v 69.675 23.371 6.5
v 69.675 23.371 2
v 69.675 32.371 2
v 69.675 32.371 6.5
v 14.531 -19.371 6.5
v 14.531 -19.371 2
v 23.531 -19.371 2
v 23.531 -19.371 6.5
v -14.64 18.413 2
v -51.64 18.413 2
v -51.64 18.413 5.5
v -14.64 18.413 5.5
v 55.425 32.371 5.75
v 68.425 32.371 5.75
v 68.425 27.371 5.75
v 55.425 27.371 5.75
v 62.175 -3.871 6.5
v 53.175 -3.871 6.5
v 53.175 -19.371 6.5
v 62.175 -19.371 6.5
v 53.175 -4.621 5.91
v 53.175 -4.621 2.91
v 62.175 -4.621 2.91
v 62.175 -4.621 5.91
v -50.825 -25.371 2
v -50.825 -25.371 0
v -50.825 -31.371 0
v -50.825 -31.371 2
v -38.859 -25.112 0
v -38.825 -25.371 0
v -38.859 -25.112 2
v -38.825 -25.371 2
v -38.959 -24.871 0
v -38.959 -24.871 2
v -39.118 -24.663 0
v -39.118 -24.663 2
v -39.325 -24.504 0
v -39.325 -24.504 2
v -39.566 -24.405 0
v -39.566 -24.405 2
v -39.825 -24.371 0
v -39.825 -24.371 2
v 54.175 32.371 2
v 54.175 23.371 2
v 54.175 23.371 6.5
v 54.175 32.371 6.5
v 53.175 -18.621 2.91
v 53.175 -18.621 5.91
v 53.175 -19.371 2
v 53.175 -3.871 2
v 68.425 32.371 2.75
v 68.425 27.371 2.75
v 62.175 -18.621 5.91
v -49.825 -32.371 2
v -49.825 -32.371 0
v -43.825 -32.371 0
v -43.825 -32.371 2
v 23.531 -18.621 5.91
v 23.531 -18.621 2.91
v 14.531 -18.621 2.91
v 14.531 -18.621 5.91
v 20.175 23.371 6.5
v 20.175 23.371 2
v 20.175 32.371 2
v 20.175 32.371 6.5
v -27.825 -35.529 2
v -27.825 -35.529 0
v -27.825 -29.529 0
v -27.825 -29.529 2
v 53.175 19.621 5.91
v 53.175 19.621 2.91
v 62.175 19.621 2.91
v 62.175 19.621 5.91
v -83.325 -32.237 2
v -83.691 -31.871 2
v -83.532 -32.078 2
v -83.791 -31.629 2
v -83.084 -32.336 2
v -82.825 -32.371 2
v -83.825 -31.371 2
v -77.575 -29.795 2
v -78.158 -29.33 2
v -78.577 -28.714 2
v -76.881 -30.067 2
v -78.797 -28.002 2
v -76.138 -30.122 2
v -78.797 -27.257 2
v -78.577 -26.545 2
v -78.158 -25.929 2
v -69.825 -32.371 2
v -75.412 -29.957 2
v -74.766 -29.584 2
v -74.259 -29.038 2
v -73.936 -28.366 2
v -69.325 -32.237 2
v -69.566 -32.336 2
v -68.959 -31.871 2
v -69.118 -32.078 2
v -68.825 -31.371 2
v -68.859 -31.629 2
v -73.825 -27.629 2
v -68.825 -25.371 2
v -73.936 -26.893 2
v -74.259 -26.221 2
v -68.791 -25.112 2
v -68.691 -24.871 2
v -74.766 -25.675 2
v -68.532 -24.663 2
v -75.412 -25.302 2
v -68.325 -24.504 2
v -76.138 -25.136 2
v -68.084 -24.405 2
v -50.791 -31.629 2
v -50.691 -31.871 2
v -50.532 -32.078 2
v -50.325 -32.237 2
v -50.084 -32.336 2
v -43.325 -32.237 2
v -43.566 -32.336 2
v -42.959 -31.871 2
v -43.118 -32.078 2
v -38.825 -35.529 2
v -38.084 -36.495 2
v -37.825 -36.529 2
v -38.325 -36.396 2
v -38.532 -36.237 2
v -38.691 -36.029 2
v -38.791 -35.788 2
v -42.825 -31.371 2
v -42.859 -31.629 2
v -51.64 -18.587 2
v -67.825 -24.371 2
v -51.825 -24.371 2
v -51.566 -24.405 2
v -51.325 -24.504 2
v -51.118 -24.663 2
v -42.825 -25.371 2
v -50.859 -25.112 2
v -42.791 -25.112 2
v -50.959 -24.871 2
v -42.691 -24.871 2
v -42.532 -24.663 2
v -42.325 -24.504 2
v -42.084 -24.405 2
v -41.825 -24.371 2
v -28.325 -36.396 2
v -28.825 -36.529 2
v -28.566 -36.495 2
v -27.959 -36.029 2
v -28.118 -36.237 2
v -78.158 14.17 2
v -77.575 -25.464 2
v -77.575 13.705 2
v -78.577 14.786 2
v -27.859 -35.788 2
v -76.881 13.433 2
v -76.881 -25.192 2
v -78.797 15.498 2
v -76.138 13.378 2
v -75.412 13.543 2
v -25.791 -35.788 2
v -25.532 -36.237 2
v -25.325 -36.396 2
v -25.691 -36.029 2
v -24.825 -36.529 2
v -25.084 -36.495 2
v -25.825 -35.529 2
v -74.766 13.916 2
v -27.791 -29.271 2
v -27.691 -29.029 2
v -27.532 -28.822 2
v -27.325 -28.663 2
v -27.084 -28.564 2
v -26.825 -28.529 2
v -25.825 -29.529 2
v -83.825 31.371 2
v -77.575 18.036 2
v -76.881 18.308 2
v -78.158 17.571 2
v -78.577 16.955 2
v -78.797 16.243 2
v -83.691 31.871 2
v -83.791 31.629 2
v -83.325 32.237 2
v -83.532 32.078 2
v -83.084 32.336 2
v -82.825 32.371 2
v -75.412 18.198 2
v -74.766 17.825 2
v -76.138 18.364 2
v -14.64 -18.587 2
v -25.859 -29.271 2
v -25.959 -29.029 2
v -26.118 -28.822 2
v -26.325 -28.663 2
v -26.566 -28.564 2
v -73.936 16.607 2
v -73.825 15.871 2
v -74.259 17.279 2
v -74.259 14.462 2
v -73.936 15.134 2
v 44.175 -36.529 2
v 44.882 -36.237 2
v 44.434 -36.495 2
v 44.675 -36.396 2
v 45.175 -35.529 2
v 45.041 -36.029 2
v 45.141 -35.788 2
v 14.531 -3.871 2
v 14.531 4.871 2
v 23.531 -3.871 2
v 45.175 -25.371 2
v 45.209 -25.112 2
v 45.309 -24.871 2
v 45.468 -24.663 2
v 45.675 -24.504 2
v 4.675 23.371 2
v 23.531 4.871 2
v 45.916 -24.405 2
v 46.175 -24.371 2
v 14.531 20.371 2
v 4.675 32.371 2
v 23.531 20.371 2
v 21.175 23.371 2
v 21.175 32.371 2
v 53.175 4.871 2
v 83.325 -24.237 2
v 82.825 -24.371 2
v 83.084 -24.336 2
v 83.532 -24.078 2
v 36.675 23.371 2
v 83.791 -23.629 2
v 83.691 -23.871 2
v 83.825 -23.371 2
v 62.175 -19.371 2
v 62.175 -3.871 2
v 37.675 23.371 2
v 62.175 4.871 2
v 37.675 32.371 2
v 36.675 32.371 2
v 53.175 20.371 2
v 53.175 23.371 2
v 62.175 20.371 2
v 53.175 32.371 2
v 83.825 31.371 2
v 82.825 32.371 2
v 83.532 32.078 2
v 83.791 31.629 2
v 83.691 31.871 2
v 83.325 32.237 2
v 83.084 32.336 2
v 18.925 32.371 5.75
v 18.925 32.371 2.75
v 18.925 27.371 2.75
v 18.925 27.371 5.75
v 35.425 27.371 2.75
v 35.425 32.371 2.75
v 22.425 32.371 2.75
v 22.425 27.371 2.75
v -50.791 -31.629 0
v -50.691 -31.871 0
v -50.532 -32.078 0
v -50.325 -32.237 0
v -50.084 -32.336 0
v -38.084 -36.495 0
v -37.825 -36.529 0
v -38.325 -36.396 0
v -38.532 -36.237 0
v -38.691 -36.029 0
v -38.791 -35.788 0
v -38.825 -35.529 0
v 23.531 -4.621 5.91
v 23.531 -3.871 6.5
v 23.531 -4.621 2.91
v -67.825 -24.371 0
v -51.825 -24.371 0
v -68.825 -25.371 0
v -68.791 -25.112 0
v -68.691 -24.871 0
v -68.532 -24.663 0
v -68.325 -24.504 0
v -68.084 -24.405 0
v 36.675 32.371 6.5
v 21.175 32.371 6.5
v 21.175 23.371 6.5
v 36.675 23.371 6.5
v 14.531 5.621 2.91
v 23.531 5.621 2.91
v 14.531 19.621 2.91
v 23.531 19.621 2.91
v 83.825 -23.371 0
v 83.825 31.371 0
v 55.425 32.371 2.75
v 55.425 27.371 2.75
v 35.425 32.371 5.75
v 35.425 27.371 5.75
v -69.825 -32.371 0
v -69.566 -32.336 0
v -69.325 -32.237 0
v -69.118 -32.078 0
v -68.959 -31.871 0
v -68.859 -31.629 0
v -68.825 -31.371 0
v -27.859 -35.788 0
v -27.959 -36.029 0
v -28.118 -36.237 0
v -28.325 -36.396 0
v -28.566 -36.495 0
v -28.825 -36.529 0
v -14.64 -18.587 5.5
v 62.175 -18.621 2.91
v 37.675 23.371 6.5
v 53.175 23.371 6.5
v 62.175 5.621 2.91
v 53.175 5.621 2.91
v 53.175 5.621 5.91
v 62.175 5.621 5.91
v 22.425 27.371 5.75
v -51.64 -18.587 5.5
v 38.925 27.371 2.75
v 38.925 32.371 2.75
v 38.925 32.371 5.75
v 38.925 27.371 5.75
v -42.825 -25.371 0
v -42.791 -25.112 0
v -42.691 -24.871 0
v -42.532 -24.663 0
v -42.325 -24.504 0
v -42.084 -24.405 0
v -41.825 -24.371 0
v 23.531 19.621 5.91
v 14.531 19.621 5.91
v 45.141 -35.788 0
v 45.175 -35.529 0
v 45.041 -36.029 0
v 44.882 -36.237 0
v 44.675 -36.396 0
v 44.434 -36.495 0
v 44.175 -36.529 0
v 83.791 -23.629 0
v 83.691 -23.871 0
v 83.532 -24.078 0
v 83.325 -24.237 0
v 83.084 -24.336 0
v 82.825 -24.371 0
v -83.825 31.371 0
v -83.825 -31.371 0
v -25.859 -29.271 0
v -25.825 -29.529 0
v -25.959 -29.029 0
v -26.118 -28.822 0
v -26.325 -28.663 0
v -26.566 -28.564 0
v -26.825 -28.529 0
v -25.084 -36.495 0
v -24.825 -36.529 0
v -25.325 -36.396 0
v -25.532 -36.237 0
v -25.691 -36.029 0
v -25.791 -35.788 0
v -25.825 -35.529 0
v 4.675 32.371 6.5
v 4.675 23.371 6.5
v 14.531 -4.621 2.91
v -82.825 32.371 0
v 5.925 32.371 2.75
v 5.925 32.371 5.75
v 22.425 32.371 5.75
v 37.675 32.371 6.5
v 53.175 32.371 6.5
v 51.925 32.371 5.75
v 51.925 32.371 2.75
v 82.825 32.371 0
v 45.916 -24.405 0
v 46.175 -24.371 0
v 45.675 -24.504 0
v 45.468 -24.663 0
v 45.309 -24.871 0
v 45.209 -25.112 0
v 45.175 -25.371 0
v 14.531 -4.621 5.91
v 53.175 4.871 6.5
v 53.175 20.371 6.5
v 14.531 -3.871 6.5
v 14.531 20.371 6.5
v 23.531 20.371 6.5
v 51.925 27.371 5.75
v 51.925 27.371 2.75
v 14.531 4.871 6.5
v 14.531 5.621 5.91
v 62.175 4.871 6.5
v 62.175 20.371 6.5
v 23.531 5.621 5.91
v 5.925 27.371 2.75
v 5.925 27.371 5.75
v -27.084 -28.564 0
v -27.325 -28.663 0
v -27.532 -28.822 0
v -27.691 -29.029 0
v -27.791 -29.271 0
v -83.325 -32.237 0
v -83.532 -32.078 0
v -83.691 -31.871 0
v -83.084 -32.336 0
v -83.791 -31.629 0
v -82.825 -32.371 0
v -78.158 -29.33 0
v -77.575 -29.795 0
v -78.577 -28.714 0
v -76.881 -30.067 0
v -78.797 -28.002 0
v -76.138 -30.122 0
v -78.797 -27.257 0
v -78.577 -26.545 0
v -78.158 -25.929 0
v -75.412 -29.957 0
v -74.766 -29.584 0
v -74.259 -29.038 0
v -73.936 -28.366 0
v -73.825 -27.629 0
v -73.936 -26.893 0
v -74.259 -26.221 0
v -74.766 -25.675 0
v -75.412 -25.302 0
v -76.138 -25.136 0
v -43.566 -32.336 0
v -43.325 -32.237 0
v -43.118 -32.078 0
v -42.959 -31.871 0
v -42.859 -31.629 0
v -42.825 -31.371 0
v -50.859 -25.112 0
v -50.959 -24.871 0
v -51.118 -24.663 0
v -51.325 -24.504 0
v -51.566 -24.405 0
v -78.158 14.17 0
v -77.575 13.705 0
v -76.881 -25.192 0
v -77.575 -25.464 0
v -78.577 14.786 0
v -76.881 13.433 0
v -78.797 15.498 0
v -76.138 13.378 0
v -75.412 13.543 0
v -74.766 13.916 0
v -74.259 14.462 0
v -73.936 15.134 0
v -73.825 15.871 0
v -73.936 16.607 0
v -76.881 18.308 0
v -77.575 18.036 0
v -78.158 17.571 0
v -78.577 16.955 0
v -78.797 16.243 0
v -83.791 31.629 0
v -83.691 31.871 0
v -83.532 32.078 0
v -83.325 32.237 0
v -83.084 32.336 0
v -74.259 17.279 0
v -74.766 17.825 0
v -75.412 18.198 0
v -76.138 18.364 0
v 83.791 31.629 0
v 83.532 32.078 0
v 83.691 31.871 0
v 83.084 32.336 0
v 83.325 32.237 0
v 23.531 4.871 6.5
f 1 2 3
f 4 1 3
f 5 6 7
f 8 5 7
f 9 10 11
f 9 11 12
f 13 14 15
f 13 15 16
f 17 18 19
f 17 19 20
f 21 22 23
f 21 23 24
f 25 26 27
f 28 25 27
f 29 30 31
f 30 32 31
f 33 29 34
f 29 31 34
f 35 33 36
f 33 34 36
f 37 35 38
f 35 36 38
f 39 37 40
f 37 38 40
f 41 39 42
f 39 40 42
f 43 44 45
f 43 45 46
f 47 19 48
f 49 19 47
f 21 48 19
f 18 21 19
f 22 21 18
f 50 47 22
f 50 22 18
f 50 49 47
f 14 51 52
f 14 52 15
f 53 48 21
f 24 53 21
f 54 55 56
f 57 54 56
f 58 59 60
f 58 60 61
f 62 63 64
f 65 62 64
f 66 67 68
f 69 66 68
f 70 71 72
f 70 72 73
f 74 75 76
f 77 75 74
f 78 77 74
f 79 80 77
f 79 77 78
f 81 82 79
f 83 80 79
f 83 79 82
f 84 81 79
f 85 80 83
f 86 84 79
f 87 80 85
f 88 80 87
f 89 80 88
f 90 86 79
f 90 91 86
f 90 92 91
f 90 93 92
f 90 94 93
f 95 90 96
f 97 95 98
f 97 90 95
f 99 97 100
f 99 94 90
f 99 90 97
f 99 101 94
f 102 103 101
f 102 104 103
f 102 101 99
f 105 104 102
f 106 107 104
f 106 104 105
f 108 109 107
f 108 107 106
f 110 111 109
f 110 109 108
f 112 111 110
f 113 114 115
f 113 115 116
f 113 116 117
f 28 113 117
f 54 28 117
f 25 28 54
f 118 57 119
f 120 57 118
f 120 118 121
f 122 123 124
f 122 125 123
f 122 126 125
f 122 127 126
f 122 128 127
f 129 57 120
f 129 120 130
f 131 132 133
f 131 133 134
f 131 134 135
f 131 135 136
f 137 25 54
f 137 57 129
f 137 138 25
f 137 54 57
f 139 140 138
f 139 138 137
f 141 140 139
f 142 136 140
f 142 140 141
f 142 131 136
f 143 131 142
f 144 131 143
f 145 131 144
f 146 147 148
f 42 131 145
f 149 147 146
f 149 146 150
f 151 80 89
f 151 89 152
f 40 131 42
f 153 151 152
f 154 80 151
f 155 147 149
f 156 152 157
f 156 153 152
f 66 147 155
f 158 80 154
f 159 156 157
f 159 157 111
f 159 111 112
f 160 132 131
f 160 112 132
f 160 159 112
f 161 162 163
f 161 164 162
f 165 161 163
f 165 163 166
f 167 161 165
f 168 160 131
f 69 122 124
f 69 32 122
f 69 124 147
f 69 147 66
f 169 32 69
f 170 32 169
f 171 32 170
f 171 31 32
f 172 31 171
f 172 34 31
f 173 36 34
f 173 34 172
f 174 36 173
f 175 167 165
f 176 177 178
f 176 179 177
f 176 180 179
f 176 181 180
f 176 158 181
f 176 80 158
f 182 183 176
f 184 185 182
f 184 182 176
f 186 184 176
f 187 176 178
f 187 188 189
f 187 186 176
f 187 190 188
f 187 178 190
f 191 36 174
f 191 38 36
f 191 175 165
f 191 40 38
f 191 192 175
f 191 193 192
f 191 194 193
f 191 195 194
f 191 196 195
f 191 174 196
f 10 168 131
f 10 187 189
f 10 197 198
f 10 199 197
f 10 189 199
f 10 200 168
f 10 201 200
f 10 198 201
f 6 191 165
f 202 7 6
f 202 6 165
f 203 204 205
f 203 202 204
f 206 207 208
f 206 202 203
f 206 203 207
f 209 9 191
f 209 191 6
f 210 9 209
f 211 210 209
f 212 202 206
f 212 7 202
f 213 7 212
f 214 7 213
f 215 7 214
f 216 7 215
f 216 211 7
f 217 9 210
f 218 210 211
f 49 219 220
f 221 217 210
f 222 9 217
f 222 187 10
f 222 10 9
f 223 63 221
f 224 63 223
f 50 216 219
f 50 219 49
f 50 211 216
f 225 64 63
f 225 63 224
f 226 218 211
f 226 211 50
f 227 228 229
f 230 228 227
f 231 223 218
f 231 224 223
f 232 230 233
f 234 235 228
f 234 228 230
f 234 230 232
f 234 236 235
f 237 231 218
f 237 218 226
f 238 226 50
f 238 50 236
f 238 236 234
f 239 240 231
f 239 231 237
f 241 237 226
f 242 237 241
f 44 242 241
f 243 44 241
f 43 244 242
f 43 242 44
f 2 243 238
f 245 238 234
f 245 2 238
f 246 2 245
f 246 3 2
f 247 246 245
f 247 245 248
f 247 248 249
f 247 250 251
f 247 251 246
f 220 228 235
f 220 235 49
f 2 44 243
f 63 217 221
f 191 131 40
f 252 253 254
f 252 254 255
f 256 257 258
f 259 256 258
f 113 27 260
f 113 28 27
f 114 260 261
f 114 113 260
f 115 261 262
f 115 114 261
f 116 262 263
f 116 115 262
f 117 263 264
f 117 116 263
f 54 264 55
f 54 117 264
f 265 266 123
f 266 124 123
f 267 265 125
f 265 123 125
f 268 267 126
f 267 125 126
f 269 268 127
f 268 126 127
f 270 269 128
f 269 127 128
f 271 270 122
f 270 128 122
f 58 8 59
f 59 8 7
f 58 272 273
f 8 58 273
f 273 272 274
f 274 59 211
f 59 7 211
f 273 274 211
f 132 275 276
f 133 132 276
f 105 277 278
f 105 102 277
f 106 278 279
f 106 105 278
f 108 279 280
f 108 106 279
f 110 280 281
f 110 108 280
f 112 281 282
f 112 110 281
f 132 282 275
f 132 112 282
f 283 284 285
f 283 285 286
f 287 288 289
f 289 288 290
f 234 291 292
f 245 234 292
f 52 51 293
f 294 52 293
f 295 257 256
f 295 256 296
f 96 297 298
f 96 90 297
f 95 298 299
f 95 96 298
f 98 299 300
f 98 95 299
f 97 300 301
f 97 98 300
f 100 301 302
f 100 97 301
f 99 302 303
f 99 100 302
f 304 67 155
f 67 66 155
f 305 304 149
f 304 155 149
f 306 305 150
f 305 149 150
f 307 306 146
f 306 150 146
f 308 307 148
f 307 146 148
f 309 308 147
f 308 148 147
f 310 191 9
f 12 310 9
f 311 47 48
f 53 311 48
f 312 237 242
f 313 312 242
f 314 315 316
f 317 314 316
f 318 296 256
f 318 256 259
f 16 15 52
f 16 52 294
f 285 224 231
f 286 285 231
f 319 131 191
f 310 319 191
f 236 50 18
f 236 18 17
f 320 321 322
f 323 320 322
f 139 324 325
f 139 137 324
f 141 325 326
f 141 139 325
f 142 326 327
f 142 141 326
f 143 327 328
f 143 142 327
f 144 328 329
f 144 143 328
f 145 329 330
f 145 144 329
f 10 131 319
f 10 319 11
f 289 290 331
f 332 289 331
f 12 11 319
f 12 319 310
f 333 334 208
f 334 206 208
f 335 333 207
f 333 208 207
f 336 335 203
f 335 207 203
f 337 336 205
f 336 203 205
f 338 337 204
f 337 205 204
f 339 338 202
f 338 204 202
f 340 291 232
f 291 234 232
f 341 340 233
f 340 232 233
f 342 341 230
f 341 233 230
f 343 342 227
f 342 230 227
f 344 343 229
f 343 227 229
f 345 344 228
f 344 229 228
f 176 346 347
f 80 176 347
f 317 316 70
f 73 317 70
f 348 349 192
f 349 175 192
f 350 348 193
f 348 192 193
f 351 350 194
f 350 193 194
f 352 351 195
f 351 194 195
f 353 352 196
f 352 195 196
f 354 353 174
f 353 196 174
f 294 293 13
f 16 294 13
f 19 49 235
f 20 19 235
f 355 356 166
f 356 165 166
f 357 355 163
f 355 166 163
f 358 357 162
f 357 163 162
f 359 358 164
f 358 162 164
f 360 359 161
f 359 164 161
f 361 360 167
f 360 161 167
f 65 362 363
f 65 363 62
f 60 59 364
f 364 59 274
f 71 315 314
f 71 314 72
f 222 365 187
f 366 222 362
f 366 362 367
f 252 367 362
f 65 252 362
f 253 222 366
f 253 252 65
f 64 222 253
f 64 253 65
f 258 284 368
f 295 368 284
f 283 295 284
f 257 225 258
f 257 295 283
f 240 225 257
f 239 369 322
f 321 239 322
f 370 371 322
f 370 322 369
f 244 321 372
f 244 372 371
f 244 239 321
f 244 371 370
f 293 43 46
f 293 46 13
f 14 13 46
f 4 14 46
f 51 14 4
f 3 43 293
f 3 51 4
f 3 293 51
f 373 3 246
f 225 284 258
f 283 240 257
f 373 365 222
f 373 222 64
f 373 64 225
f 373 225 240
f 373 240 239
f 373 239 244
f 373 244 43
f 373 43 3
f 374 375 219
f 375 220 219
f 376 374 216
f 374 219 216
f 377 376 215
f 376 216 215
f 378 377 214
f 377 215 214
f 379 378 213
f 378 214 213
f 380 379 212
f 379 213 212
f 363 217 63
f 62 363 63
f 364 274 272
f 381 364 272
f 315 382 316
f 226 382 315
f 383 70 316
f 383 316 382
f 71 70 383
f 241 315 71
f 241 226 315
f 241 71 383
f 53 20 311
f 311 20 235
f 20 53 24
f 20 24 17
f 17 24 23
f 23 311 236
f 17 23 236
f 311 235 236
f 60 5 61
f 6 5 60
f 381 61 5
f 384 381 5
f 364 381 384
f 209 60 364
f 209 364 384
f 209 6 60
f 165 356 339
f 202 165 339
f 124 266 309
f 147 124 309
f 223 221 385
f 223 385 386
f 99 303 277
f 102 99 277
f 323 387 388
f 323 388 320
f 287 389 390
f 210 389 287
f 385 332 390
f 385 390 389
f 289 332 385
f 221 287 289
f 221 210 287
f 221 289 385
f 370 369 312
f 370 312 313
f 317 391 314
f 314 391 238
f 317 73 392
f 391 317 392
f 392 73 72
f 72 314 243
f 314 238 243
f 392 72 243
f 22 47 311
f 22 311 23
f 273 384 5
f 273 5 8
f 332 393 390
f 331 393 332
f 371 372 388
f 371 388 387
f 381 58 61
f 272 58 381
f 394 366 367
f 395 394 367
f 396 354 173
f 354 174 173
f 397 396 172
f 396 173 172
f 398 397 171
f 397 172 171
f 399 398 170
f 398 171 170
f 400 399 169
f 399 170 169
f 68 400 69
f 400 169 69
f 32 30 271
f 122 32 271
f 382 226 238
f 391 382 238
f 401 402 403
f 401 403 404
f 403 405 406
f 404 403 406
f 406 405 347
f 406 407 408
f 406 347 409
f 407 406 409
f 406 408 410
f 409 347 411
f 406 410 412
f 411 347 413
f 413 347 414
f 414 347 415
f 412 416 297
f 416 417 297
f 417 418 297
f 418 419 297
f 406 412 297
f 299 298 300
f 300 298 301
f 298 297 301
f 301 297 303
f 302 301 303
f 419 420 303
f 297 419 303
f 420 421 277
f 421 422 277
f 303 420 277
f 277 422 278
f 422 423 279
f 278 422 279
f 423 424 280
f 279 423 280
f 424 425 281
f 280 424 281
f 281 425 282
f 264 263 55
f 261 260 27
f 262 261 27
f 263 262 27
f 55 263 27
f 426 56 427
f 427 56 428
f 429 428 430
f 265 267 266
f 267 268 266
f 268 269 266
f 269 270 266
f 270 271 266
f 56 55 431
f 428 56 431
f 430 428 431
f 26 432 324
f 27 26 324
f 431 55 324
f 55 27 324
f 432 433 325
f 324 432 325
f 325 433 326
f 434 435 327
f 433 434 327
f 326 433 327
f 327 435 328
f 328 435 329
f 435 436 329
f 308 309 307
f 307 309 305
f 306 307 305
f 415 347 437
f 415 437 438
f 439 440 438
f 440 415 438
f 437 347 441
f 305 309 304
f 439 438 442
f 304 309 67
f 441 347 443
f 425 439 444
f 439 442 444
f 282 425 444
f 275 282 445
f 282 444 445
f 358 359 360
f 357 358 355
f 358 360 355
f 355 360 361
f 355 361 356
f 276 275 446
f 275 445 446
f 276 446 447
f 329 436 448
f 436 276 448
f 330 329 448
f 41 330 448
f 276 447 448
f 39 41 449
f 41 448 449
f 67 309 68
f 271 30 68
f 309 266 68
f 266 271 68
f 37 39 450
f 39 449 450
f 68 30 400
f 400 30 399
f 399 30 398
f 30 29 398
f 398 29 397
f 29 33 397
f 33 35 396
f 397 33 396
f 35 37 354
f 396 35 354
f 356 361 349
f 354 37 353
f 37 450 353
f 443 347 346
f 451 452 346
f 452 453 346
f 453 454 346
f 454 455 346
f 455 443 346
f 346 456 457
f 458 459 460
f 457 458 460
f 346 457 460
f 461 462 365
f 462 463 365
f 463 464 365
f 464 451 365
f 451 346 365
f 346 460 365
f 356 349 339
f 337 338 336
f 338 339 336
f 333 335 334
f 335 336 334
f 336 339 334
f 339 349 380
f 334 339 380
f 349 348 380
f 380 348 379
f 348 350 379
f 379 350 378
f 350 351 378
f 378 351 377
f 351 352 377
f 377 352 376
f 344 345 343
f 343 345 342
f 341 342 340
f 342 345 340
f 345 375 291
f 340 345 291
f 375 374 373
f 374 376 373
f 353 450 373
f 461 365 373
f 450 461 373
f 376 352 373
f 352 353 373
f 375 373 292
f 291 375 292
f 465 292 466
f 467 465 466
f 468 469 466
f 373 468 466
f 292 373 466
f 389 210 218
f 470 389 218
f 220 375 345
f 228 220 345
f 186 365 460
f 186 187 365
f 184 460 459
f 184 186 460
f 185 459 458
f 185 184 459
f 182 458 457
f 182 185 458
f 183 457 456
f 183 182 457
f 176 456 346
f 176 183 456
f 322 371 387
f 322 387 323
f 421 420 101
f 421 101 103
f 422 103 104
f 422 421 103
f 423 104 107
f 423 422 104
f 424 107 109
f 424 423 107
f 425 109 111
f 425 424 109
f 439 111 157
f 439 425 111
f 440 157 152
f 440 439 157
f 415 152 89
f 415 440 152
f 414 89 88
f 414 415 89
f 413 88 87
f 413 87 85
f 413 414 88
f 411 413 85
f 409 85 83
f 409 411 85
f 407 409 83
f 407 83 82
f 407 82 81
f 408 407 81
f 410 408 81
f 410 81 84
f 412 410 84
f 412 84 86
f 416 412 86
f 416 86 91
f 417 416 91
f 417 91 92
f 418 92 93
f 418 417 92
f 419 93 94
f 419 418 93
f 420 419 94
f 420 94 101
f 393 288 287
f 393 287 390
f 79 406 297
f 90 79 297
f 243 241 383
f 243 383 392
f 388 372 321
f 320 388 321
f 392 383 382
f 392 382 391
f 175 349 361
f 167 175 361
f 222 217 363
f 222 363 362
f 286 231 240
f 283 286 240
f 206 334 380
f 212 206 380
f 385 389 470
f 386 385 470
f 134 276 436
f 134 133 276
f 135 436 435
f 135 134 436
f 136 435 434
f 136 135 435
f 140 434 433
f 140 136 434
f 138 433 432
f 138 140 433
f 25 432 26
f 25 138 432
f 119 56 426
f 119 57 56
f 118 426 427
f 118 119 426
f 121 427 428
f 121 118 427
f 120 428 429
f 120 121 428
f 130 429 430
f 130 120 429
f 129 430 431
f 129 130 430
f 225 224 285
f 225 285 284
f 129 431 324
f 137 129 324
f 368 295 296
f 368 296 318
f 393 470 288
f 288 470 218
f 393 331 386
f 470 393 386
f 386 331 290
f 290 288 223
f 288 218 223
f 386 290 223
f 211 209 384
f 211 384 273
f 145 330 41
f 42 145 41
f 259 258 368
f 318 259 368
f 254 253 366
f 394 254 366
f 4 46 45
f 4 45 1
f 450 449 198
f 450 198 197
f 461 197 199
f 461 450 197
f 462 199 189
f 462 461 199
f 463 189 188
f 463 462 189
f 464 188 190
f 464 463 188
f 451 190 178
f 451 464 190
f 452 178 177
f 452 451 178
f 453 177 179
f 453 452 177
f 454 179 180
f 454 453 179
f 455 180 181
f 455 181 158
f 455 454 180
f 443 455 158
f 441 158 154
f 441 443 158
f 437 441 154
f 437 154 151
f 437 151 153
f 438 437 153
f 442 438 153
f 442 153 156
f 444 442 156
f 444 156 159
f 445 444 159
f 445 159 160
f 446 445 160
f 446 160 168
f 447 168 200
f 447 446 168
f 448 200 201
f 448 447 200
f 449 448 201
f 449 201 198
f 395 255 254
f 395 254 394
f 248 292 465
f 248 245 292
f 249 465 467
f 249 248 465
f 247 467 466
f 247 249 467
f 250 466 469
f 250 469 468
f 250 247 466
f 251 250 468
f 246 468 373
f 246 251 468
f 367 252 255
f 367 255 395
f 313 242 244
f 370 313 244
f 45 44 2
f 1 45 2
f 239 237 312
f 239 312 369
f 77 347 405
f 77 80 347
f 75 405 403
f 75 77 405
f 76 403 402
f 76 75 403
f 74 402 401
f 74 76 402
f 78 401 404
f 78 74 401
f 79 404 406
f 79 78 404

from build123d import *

# Parameters (mm, degrees)
F0_R          = 2.5
F1_DEPTH      = 2
F3_R          = 0.99999
F2_W          = 15.5
F2_H          = 9
F2_W_2        = 9
F2_H_2        = 15.5
F2_W_3        = 37
F2_H_3        = 37
F4_DEPTH      = 0.5
F5_DEPTH      = 0.5
F6_DEPTH      = 5
F7_W          = 14
F7_H          = 3
F8_DEPTH      = 107.3565227488
F8_DEPTH_BACK = 60.2954772512
F9_W          = 13
F9_H          = 3
F10_DEPTH     = 5
F11_DEPTH     = 4


# Not quite as in the source:
# - a fillet or chamfer is up to 0.001 mm smaller than in the source, because OpenCascade refuses the exact size


with BuildPart() as f1:
    # F0 (on Top) → F1 (new body)
    with BuildSketch(Plane.XY):
        Polygon((83.825, -24.3705166107), (83.825, 32.3705166107), (-83.825, 32.3705166107), (-83.825, -32.3705166107), (-68.825, -32.3705166107), (-68.825, -24.3705166107), (-50.825, -24.3705166107), (-50.825, -32.3705166107), (-42.825, -32.3705166107), (-42.825, -24.3705166107), (-38.825, -24.3705166107), (-38.825, -36.5294833893), (-27.825, -36.5294833893), (-27.825, -28.5294833893), (-25.825, -28.5294833893), (-25.825, -36.5294833893), (45.175, -36.5294833893), (45.175, -24.3705166107), align=None)
        with Locations((-76.325, -27.6294833893)):
            Circle(F0_R, mode=Mode.SUBTRACT)
        with Locations((-76.325, 15.8705166107)):
            Circle(F0_R, mode=Mode.SUBTRACT)
    extrude(amount=F1_DEPTH)

    # F3 (radius 1 in the source; OpenCascade refuses exactly that, so slightly less here)
    f3_edges = [f1.edges().sort_by_distance(p)[0] for p in [
        (-83.825, -32.370517, 1),
        (-68.825, -32.370517, 1),
        (-68.825, -24.370517, 1),
        (-50.825, -32.370517, 1),
        (-42.825, -32.370517, 1),
        (-42.825, -24.370517, 1),
        (-38.825, -36.529483, 1),
        (-27.825, -36.529483, 1),
        (-27.825, -28.529483, 1),
        (-25.825, -36.529483, 1),
        (83.825, -24.370517, 1),
        (45.175, -24.370517, 1),
        (45.175, -36.529483, 1),
        (83.825, 32.370517, 1),
        (-83.825, 32.370517, 1),
        (-50.825, -24.370517, 1),
        (-38.825, -24.370517, 1),
        (-25.825, -28.529483, 1),
    ]]
    fillet(f3_edges, radius=F3_R)

    # F2 (on face) → F4 (cut)
    with BuildSketch(Plane.XY.offset(2)):
        with Locations((-70.075, 27.8705166107)):
            Rectangle(F2_W, F2_H)
        with Locations((-53.575, 27.8705166107)):
            Rectangle(F2_W, F2_H)
        with Locations((-37.075, 27.8705166107)):
            Rectangle(F2_W, F2_H)
        with Locations((-20.575, 27.8705166107)):
            Rectangle(F2_W, F2_H)
        with Locations((-4.075, 27.8705166107)):
            Rectangle(F2_W, F2_H)
        with Locations((12.425, 27.8705166107)):
            Rectangle(F2_W, F2_H)
        with Locations((28.925, 27.8705166107)):
            Rectangle(F2_W, F2_H)
        with Locations((45.425, 27.8705166107)):
            Rectangle(F2_W, F2_H)
        with Locations((61.925, 27.8705166107)):
            Rectangle(F2_W, F2_H)
        with Locations((57.675, 12.6205166107)):
            Rectangle(F2_W_2, F2_H_2)
        with Locations((57.675, -11.6205166107)):
            Rectangle(F2_W_2, F2_H_2)
        with Locations((19.0305227488, 12.6205166107)):
            Rectangle(F2_W_2, F2_H_2)
        with Locations((19.0305227488, -11.6205166107)):
            Rectangle(F2_W_2, F2_H_2)
        with Locations((-33.1395904124, -0.086670503)):
            Rectangle(F2_W_3, F2_H_3)
    extrude(amount=-F4_DEPTH, mode=Mode.SUBTRACT)

    # F5 (add, through all): faces of the model
    f5_faces = [f1.faces().sort_by_distance(p)[0] for p in [
        (-70.075, 27.8705166107, 1.5),
        (-53.575, 27.8705166107, 1.5),
        (-37.075, 27.8705166107, 1.5),
        (-20.575, 27.8705166107, 1.5),
        (-4.075, 27.8705166107, 1.5),
    ]]
    extrude(f5_faces, amount=F5_DEPTH)

    # F6 (add): faces of the model
    f6_faces = [f1.faces().sort_by_distance(p)[0] for p in [
        (12.425, 27.8705166107, 1.5),
        (28.925, 27.8705166107, 1.5),
        (45.425, 27.8705166107, 1.5),
        (61.925, 27.8705166107, 1.5),
        (19.0305227488, 12.6205166107, 1.5),
        (57.675, 12.6205166107, 1.5),
        (19.0305227488, -11.6205166107, 1.5),
        (57.675, -11.6205166107, 1.5),
    ]]
    extrude(f6_faces, amount=F6_DEPTH)

    # F7 (on face) → F8 (cut, two sides)
    with BuildSketch(Plane.YZ.offset(23.5305227488)) as f8_sk:
        with Locations((-11.6205166107, 4.4102044776)):
            Rectangle(F7_W, F7_H)
        with Locations((12.6205166107, 4.4102044776)):
            Rectangle(F7_W, F7_H)
    extrude(amount=-F8_DEPTH, mode=Mode.SUBTRACT)
    extrude(f8_sk.sketch, amount=F8_DEPTH_BACK, mode=Mode.SUBTRACT)

    # F9 (on face) → F10 (cut)
    with BuildSketch(Plane(origin=(0, 32.3705166107, 0), x_dir=(-1, 0, 0), z_dir=(0, 1, 0))):
        with Locations((-12.425, 4.25)):
            Rectangle(F9_W, F9_H)
        with Locations((-28.925, 4.25)):
            Rectangle(F9_W, F9_H)
        with Locations((-45.425, 4.25)):
            Rectangle(F9_W, F9_H)
        with Locations((-61.925, 4.25)):
            Rectangle(F9_W, F9_H)
    extrude(amount=-F10_DEPTH, mode=Mode.SUBTRACT)

    # F11 (add): a face of the model
    f11_faces = [f1.faces().sort_by_distance(p)[0] for p in [
        (-33.1395904124, -0.086670503, 1.5),
    ]]
    extrude(f11_faces, amount=F11_DEPTH)


solid = f1.part
